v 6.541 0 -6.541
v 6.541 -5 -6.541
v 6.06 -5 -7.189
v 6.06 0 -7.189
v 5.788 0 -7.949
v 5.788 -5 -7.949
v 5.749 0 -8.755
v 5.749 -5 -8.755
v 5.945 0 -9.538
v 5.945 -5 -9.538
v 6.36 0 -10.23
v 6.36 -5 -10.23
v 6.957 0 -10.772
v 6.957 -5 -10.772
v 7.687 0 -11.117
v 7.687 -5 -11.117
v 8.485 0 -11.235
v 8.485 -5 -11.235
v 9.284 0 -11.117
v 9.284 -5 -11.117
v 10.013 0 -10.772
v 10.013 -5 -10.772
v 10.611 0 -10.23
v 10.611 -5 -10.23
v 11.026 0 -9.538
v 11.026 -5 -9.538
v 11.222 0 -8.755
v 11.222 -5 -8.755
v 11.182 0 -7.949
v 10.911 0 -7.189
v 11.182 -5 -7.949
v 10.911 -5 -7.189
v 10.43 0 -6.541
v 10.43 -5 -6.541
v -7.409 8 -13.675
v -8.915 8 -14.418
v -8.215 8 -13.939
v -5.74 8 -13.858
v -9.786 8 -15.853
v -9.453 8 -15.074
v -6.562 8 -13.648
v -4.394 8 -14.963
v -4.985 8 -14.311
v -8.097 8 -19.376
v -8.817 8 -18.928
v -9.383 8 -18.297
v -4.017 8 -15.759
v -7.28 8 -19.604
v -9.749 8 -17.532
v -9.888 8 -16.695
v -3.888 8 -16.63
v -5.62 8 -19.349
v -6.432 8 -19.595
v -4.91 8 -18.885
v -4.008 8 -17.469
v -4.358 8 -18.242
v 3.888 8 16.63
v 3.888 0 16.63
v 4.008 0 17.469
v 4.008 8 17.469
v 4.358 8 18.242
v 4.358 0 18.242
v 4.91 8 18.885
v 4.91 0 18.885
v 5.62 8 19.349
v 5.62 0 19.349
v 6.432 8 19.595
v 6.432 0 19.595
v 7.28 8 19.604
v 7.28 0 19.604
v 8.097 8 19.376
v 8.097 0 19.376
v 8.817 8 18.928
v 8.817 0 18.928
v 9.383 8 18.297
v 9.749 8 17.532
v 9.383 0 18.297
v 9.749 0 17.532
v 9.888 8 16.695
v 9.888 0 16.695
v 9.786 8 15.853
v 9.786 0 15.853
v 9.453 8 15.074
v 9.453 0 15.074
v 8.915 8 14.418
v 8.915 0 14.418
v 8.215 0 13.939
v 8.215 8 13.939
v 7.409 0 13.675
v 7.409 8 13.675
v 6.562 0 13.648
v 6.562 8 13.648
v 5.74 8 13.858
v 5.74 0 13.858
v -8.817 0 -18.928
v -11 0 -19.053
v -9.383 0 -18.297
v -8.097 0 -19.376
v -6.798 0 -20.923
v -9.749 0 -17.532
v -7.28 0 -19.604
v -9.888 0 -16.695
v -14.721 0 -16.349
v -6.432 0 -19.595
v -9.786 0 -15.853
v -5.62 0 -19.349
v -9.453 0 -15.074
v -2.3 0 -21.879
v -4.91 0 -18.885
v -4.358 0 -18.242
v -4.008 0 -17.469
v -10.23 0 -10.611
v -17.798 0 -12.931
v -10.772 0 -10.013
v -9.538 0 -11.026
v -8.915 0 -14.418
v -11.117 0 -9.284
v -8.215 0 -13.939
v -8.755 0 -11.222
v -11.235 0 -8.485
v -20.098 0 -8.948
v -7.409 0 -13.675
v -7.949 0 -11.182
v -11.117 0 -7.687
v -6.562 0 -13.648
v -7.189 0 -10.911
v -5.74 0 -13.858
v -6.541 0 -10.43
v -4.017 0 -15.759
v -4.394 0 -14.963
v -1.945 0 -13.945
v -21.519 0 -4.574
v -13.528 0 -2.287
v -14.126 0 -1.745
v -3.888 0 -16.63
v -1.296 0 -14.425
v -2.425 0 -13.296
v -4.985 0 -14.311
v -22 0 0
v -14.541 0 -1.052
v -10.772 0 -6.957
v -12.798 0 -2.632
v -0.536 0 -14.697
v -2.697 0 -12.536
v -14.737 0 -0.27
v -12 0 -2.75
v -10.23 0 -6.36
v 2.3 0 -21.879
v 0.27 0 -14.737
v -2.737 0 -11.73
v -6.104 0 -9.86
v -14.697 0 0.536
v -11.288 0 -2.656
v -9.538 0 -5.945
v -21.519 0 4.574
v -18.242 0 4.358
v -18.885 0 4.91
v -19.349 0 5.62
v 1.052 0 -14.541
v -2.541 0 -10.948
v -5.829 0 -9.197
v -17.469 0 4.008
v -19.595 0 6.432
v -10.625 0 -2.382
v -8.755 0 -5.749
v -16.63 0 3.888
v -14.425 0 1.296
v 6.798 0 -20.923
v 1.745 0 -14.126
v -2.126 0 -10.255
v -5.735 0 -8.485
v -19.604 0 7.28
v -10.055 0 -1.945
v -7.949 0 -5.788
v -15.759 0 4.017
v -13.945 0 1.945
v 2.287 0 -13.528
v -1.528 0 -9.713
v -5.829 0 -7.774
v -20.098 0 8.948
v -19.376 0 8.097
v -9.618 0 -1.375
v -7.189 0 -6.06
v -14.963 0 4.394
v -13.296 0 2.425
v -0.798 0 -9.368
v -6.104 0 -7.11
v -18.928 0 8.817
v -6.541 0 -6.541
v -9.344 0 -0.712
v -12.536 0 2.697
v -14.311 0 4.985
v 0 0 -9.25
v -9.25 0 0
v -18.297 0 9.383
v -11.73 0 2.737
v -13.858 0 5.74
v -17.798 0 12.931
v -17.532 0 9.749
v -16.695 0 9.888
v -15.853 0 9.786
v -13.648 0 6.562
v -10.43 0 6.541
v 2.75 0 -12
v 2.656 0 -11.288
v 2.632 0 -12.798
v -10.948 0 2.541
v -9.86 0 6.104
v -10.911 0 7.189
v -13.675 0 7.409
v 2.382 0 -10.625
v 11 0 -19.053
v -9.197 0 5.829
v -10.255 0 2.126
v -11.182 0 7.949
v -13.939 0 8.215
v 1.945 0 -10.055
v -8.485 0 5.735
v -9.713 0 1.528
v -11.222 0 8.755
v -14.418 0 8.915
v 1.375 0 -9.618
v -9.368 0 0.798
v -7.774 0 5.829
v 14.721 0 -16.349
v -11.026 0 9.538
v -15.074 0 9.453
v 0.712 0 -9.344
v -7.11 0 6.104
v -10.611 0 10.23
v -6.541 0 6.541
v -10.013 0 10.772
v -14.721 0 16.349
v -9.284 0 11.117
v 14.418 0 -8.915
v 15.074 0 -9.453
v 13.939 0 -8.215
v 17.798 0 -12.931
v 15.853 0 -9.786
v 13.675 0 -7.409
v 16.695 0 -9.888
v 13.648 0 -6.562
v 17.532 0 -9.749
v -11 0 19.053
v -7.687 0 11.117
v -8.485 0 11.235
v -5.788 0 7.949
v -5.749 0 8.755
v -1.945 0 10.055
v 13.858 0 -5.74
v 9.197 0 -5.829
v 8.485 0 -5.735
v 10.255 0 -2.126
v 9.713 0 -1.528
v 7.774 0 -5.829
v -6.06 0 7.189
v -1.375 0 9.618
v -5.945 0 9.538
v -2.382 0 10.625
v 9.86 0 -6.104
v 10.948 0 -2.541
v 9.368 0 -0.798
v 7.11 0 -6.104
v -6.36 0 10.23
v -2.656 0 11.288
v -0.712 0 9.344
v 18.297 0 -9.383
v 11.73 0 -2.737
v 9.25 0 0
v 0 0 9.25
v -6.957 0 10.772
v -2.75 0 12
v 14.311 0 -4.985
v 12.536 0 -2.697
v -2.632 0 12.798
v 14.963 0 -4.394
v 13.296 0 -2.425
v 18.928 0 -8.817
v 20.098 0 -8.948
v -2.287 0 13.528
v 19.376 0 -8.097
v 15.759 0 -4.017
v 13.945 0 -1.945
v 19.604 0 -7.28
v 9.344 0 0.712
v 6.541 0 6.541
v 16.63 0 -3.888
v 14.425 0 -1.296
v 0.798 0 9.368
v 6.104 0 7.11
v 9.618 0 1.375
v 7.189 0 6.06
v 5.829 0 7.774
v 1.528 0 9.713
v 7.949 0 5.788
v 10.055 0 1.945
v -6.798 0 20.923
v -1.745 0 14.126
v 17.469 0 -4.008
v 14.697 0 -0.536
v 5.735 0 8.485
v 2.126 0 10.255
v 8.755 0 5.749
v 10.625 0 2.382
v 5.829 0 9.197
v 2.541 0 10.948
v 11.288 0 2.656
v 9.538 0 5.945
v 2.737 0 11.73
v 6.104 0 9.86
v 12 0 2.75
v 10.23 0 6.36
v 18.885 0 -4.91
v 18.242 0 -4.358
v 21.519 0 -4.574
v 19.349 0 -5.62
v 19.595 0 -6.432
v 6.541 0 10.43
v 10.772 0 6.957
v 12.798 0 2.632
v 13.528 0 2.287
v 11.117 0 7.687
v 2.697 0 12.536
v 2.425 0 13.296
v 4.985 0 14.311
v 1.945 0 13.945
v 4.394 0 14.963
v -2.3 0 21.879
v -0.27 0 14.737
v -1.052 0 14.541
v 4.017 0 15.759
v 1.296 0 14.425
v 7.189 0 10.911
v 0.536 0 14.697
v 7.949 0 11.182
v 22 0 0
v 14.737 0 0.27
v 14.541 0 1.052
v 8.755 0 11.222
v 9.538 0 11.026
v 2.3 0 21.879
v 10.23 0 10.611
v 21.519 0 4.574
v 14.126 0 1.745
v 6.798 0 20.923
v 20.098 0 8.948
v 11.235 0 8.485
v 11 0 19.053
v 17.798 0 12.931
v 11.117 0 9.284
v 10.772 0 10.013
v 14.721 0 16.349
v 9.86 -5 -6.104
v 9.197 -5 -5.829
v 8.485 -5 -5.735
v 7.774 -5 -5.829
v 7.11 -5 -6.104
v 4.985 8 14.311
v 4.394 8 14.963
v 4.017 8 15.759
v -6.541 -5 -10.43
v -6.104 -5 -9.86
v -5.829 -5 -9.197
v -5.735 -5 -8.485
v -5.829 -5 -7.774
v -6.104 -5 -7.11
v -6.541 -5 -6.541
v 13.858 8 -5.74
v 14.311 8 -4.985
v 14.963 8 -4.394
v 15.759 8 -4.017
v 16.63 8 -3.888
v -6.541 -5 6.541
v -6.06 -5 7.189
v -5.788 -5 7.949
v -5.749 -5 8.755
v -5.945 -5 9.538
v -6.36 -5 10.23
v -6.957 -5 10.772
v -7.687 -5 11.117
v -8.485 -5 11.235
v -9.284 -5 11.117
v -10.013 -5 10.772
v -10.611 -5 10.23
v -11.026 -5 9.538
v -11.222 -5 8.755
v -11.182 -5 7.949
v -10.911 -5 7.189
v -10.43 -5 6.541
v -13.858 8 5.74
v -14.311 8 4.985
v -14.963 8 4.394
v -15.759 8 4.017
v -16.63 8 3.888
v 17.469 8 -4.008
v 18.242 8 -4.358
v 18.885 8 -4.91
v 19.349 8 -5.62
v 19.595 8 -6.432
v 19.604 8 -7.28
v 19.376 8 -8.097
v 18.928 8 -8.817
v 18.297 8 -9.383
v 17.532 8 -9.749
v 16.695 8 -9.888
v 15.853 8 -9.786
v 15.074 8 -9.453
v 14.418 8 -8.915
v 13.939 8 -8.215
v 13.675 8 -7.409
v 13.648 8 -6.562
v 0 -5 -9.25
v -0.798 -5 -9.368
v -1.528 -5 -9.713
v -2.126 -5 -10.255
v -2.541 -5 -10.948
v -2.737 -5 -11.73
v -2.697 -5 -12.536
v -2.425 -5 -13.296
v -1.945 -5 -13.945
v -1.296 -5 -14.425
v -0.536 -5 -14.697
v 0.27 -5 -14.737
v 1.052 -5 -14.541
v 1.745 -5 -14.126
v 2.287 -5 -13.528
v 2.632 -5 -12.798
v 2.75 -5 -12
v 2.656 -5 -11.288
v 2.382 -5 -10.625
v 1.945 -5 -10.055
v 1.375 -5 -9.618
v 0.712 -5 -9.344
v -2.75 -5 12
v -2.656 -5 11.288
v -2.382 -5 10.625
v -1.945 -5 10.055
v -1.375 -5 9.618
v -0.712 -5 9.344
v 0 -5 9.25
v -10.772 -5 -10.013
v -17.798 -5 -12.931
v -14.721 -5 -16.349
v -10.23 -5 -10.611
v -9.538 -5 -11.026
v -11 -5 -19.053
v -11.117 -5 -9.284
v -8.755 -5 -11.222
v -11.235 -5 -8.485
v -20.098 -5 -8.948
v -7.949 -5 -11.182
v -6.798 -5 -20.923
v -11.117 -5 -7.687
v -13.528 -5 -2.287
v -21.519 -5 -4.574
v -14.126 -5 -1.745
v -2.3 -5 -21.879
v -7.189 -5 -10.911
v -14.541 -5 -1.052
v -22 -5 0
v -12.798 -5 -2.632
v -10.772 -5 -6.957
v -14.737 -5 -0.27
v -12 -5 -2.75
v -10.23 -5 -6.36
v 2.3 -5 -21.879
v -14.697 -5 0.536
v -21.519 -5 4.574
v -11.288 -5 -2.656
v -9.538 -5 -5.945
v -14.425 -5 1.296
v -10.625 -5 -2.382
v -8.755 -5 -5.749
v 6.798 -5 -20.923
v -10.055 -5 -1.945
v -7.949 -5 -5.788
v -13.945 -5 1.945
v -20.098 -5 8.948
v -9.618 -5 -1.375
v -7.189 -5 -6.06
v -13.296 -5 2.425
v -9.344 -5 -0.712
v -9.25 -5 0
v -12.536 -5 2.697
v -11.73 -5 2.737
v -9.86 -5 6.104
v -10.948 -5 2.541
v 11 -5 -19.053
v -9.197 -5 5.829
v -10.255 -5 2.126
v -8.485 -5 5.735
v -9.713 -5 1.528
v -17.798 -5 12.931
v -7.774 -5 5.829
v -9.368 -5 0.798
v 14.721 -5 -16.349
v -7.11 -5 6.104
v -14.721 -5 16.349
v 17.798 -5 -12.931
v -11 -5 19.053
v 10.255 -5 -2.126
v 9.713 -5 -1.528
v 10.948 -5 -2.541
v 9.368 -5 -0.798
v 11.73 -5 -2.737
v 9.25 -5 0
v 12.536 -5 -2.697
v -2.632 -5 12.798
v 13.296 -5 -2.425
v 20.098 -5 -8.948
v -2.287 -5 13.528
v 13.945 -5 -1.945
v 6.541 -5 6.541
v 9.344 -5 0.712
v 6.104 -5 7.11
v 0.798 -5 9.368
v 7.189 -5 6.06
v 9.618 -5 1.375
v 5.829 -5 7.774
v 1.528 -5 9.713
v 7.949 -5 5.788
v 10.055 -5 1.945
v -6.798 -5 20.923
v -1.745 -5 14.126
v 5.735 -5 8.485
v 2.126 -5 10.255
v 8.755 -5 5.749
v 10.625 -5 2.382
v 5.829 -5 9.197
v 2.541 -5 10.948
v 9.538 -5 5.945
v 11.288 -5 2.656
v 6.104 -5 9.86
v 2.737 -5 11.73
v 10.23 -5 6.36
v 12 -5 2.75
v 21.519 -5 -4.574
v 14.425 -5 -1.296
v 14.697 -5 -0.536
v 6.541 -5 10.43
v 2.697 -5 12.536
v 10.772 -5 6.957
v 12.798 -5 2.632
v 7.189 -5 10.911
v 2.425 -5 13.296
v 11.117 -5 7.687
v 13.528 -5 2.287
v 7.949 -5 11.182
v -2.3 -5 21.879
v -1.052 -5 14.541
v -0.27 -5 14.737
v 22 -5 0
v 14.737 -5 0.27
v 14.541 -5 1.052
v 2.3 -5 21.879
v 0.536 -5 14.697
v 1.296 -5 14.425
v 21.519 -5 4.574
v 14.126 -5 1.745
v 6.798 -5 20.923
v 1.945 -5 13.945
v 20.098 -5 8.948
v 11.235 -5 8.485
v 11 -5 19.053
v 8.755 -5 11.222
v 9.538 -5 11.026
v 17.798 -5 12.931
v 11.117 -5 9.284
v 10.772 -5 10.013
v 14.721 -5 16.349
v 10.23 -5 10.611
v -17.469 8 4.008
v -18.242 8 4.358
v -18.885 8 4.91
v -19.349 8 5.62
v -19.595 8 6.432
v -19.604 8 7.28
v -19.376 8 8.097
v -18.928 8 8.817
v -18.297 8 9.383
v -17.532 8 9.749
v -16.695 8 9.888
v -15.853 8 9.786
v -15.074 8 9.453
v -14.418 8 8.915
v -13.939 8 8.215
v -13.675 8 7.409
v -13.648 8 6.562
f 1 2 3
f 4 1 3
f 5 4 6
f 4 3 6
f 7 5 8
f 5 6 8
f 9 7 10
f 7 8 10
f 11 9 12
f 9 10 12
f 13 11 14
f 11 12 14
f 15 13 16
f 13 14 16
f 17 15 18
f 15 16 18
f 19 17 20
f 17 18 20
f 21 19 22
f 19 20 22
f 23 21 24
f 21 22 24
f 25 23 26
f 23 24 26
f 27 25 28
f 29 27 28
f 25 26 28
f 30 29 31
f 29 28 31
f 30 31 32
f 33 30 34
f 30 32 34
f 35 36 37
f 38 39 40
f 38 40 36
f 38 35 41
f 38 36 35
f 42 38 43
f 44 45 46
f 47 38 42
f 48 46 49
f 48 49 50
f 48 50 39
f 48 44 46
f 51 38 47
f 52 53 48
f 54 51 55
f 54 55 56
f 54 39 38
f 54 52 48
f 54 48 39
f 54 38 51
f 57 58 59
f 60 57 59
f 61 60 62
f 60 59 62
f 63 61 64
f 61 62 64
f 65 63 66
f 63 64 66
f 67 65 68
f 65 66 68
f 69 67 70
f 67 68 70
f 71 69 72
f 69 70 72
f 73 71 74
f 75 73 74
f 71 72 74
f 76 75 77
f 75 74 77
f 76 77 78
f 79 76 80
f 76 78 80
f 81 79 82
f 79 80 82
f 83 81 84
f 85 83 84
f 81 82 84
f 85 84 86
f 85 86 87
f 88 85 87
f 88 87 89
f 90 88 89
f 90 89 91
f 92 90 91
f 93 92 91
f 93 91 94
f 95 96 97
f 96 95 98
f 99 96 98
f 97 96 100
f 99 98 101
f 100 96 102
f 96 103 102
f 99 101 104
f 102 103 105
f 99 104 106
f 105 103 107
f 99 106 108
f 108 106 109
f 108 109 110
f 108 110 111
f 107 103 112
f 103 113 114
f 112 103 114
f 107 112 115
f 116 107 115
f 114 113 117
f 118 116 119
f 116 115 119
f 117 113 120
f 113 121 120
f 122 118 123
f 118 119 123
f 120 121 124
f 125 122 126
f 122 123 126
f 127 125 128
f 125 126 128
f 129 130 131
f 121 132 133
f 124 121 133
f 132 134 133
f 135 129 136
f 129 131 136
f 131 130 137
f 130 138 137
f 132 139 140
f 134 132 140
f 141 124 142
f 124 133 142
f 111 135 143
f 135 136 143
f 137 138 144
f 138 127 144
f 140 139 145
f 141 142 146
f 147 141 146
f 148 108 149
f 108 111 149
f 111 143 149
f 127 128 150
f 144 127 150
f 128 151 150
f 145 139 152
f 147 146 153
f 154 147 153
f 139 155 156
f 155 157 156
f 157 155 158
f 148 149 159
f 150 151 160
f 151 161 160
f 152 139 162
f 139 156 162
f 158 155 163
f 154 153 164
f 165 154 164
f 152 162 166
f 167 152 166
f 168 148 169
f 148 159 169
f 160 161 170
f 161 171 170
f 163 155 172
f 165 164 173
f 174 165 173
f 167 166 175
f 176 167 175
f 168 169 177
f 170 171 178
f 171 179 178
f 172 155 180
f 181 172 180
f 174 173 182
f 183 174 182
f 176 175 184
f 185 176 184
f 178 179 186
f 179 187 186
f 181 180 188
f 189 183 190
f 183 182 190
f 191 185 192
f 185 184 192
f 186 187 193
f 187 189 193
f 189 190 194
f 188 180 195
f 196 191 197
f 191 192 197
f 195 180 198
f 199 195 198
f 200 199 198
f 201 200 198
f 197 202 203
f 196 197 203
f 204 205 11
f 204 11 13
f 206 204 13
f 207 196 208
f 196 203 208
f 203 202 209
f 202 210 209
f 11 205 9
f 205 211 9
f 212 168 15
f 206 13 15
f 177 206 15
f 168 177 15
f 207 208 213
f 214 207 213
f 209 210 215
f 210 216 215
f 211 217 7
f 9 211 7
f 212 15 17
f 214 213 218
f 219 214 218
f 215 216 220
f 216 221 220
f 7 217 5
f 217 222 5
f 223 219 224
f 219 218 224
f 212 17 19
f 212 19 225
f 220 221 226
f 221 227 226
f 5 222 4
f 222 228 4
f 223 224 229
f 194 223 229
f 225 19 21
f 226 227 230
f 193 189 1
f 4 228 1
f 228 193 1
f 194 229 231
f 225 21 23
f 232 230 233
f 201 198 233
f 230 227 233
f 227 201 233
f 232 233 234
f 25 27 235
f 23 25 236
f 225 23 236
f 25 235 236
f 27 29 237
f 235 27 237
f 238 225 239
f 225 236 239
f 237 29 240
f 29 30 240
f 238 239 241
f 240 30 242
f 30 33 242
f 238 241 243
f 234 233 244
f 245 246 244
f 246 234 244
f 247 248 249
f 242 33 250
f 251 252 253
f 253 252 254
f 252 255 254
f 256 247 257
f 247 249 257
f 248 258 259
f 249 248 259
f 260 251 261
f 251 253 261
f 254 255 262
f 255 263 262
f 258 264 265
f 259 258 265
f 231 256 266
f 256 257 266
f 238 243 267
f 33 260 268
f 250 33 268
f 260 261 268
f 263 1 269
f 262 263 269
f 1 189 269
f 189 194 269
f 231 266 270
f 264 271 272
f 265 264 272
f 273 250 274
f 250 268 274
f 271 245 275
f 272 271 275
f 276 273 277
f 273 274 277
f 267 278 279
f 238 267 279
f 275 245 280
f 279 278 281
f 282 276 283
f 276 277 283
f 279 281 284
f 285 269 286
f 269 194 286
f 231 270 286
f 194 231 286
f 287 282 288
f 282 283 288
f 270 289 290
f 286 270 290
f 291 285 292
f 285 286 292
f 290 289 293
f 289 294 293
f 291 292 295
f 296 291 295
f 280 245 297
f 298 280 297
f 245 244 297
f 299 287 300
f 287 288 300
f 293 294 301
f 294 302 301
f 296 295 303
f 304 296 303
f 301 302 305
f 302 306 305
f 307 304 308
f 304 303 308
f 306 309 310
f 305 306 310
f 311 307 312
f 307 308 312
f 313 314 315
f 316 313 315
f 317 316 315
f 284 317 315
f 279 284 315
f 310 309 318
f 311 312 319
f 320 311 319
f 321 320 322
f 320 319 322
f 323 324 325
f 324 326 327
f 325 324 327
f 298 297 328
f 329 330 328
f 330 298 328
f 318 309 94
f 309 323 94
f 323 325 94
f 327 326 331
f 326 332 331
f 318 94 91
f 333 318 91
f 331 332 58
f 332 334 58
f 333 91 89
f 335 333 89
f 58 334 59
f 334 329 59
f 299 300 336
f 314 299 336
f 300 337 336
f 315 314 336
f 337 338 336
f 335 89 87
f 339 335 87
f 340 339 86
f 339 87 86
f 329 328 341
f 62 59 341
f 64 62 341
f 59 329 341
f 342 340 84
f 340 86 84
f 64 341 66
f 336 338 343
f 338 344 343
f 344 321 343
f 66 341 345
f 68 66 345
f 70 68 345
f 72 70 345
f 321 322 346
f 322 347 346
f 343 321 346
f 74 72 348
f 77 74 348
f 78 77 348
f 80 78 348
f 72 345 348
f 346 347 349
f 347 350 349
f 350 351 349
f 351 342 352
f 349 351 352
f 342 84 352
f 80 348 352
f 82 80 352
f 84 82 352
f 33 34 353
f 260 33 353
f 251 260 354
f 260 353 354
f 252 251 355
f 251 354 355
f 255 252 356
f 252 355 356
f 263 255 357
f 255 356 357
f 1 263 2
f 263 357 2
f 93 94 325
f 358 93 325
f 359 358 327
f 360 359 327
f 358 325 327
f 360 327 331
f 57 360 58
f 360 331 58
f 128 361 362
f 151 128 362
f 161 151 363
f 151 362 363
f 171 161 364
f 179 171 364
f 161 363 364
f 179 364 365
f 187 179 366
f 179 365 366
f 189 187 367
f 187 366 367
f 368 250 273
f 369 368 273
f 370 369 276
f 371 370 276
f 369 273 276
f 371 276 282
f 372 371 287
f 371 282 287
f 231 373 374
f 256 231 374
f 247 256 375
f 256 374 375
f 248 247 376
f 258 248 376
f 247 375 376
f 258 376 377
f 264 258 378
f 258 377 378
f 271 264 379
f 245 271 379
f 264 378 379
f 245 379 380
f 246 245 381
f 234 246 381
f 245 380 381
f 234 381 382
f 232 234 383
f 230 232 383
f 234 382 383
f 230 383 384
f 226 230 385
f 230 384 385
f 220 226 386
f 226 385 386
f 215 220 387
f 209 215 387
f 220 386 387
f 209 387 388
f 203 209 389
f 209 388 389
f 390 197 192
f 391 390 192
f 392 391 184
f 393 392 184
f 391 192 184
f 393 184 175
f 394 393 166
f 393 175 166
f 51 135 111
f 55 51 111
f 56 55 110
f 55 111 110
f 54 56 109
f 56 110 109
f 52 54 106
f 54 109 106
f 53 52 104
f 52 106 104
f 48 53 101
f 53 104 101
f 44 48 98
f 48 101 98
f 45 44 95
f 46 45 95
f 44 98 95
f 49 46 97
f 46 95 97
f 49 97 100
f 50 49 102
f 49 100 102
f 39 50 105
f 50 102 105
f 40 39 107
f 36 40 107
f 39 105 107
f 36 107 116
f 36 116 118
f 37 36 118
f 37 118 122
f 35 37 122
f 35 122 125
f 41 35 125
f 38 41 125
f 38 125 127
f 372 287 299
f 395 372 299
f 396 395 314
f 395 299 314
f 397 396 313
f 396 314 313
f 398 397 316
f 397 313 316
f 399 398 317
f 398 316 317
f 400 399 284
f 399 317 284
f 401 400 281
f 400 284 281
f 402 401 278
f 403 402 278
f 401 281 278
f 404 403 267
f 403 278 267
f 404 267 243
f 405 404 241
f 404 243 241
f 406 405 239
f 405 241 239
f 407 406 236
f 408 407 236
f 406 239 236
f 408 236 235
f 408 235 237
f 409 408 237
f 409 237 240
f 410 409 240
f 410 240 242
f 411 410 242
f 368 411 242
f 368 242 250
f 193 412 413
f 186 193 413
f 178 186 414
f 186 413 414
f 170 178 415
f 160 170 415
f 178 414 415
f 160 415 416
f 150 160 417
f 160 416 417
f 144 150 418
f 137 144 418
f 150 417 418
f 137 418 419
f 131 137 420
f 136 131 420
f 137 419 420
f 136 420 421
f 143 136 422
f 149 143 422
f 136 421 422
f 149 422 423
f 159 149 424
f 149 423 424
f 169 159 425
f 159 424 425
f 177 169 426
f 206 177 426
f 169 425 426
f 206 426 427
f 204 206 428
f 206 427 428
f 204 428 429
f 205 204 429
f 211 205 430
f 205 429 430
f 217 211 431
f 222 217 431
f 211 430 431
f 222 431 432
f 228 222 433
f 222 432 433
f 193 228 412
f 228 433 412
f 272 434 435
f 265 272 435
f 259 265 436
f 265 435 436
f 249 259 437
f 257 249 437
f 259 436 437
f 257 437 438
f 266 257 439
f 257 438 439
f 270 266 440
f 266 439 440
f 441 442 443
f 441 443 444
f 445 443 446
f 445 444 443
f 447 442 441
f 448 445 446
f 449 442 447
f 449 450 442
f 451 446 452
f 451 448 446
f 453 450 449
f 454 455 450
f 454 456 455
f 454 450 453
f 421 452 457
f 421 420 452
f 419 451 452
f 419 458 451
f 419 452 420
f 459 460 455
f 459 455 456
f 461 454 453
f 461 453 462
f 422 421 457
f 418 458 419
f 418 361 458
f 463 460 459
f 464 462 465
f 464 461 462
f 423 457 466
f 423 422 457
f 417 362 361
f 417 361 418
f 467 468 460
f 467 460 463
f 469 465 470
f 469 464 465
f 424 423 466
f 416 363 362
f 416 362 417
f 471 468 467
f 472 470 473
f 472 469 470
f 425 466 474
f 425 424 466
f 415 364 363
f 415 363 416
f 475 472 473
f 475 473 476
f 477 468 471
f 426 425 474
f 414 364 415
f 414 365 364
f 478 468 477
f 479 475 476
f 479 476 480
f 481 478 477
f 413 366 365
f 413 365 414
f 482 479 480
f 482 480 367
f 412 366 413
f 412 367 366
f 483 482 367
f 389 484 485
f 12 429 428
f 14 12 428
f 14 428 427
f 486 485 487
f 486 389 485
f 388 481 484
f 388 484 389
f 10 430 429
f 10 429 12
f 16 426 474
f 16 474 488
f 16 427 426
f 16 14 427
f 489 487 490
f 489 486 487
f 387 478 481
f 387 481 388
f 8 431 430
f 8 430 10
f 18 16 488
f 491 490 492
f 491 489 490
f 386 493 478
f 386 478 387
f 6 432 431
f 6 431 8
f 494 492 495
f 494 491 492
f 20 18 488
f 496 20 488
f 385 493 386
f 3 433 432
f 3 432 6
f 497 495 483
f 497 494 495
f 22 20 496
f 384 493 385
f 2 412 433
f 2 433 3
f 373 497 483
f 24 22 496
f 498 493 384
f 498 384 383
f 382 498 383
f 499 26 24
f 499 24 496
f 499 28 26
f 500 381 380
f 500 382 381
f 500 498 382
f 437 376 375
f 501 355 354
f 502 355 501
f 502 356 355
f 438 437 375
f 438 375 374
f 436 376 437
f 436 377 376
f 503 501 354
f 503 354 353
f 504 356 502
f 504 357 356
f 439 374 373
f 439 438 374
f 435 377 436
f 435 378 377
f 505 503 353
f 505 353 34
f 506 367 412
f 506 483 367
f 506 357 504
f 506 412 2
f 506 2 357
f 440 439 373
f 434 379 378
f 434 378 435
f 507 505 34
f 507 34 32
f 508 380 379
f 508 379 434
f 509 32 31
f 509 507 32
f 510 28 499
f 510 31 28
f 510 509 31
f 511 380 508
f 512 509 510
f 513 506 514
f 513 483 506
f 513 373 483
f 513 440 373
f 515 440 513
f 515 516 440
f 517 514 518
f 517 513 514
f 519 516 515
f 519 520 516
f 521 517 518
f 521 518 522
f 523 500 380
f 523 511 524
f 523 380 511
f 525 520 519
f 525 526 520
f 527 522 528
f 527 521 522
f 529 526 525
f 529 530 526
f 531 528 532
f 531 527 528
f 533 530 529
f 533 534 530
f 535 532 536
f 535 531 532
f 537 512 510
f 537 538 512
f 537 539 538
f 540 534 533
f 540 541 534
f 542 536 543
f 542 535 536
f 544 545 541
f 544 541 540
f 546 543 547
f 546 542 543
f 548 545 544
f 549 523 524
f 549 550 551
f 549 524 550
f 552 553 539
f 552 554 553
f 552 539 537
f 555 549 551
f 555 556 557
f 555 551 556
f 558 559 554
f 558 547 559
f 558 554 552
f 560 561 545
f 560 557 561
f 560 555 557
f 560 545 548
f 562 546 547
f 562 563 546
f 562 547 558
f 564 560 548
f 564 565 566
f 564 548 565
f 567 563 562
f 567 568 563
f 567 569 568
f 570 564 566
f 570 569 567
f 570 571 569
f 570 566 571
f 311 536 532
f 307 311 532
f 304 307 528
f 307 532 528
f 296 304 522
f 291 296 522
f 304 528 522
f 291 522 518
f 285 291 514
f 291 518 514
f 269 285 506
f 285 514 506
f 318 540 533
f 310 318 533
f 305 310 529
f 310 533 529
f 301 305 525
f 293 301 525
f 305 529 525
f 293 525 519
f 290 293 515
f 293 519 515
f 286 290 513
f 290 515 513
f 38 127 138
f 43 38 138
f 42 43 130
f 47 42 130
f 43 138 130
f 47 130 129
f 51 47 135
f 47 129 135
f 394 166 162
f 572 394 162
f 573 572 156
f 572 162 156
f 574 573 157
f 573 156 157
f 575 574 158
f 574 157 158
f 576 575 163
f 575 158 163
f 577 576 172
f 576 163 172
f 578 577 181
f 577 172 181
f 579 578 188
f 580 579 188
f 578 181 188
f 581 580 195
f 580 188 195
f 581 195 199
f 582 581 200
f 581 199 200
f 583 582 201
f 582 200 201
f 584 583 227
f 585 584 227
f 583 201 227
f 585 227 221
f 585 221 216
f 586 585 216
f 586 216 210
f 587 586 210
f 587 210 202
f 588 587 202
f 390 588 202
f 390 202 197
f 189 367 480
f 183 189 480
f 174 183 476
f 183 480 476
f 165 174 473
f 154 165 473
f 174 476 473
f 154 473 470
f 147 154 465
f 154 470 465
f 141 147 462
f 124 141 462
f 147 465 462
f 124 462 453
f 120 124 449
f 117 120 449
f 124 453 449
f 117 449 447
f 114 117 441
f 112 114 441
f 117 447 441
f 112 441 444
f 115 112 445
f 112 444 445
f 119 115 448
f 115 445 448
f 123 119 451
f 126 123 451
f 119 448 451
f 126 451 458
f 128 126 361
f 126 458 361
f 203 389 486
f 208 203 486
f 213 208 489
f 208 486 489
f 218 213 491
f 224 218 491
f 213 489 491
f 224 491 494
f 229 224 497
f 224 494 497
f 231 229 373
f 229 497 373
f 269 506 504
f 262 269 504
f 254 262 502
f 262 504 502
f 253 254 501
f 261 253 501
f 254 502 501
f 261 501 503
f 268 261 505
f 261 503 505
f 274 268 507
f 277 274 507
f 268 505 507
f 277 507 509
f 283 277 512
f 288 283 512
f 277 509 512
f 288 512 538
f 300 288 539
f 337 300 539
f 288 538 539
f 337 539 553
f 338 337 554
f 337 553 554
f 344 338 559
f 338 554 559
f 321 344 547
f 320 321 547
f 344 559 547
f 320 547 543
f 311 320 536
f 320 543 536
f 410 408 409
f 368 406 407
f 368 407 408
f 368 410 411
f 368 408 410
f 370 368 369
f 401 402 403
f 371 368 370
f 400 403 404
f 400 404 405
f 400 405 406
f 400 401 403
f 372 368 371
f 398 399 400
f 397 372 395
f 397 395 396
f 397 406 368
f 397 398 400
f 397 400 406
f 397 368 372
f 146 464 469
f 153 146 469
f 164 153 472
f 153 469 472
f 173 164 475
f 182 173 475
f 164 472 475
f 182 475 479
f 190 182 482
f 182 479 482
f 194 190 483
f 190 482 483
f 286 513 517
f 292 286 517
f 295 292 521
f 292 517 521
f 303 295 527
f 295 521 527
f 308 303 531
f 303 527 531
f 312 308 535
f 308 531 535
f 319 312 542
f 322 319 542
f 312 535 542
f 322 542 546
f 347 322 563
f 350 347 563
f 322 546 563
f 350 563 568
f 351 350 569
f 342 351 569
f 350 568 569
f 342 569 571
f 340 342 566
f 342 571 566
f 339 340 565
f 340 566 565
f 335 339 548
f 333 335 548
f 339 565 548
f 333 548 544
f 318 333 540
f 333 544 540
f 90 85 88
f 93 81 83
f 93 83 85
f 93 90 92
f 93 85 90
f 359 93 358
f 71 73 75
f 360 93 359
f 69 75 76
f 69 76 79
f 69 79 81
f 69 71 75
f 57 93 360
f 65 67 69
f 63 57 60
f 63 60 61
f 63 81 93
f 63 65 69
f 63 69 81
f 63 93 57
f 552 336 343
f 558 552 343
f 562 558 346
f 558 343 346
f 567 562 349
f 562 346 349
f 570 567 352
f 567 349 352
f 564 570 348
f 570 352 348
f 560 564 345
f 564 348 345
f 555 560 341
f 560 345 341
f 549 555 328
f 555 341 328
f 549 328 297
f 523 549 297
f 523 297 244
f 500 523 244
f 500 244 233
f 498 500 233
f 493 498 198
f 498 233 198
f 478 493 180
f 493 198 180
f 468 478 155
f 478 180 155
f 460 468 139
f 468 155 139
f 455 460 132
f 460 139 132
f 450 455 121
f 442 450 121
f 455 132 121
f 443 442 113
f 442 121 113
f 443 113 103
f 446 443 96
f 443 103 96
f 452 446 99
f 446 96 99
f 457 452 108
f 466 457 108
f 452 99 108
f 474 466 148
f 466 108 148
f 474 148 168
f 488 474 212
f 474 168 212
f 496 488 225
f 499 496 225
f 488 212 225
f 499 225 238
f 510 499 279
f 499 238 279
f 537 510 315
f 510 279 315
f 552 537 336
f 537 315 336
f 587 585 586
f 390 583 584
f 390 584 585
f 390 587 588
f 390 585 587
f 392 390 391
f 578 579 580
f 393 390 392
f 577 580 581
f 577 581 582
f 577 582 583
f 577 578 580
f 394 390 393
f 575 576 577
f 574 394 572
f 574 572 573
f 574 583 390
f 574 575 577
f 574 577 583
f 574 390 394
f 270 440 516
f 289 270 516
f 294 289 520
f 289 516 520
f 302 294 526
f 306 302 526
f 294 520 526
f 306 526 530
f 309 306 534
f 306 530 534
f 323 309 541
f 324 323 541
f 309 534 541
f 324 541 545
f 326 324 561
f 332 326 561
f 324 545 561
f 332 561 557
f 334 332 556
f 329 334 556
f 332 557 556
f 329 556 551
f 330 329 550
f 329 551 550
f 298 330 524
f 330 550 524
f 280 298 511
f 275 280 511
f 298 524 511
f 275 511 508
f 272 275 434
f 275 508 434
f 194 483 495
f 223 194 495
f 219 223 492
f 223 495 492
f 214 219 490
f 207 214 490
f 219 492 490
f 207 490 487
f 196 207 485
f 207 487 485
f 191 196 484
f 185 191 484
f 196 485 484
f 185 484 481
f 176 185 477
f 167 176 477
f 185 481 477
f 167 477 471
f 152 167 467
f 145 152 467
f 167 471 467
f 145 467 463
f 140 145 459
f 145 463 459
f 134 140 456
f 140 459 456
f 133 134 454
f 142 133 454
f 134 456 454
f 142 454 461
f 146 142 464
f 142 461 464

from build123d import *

# Parameters (mm, degrees)
F0_R            = 22
F1_DEPTH        = 5
F3_DEPTH        = 25
F3_COPIES_COUNT = 8
F5_DEPTH        = 8
F5_COPIES_COUNT = 4


# Not quite as in the source:
# - a pattern or mirror of a feature is missing from the dataset's text; its kind, count and spacing are read off the source's solid
# - a feature names something its author has since deleted; it is built from what else it names


with BuildPart() as f1:
    # F0 (on Front) → F1 (new body)
    with BuildSketch(Plane.XZ):
        Circle(F0_R)
    extrude(amount=F1_DEPTH)

    # F2 (on face) → F3 (cut)
    with BuildSketch(Plane.XZ.offset(5)):
        with BuildLine():
            ThreePointArc((0, -9.25), (-1.9445436483, -13.9445436483), (2.75, -12))
            ThreePointArc((2.75, -12), (1.9445436483, -10.0554563517), (0, -9.25))
        make_face()
    f3 = extrude(amount=-F3_DEPTH, mode=Mode.SUBTRACT)

    # F3_copies: F3 ×8 about axis
    f3_copies_axis = Axis((0, 0, 0), (0, 1, 0))
    for i in range(1, F3_COPIES_COUNT):
        add(f3.rotate(f3_copies_axis, i * 360 / F3_COPIES_COUNT), mode=Mode.SUBTRACT)

    # F4 (on face) → F5 (join)
    with BuildSketch(Plane(origin=(0, 0, 0), x_dir=(-1, 0, 0), z_dir=(0, 1, 0))):
        with BuildLine():
            ThreePointArc((-5.7402514855, 13.8581929877), (-4.3938929457, 14.9631208861), (-3.8883017826, 16.6298315852))
            ThreePointArc((-3.8883017826, 16.6298315852), (-9.3827106195, 18.2965422843), (-5.7402514855, 13.8581929877))
        make_face()
    f5 = extrude(amount=F5_DEPTH)

    # F5_copies: F5 ×4 about axis
    f5_copies_axis = Axis((0, 0, 0), (0, 1, 0))
    for i in range(1, F5_COPIES_COUNT):
        add(f5.rotate(f5_copies_axis, i * 360 / F5_COPIES_COUNT))


solid = f1.part
